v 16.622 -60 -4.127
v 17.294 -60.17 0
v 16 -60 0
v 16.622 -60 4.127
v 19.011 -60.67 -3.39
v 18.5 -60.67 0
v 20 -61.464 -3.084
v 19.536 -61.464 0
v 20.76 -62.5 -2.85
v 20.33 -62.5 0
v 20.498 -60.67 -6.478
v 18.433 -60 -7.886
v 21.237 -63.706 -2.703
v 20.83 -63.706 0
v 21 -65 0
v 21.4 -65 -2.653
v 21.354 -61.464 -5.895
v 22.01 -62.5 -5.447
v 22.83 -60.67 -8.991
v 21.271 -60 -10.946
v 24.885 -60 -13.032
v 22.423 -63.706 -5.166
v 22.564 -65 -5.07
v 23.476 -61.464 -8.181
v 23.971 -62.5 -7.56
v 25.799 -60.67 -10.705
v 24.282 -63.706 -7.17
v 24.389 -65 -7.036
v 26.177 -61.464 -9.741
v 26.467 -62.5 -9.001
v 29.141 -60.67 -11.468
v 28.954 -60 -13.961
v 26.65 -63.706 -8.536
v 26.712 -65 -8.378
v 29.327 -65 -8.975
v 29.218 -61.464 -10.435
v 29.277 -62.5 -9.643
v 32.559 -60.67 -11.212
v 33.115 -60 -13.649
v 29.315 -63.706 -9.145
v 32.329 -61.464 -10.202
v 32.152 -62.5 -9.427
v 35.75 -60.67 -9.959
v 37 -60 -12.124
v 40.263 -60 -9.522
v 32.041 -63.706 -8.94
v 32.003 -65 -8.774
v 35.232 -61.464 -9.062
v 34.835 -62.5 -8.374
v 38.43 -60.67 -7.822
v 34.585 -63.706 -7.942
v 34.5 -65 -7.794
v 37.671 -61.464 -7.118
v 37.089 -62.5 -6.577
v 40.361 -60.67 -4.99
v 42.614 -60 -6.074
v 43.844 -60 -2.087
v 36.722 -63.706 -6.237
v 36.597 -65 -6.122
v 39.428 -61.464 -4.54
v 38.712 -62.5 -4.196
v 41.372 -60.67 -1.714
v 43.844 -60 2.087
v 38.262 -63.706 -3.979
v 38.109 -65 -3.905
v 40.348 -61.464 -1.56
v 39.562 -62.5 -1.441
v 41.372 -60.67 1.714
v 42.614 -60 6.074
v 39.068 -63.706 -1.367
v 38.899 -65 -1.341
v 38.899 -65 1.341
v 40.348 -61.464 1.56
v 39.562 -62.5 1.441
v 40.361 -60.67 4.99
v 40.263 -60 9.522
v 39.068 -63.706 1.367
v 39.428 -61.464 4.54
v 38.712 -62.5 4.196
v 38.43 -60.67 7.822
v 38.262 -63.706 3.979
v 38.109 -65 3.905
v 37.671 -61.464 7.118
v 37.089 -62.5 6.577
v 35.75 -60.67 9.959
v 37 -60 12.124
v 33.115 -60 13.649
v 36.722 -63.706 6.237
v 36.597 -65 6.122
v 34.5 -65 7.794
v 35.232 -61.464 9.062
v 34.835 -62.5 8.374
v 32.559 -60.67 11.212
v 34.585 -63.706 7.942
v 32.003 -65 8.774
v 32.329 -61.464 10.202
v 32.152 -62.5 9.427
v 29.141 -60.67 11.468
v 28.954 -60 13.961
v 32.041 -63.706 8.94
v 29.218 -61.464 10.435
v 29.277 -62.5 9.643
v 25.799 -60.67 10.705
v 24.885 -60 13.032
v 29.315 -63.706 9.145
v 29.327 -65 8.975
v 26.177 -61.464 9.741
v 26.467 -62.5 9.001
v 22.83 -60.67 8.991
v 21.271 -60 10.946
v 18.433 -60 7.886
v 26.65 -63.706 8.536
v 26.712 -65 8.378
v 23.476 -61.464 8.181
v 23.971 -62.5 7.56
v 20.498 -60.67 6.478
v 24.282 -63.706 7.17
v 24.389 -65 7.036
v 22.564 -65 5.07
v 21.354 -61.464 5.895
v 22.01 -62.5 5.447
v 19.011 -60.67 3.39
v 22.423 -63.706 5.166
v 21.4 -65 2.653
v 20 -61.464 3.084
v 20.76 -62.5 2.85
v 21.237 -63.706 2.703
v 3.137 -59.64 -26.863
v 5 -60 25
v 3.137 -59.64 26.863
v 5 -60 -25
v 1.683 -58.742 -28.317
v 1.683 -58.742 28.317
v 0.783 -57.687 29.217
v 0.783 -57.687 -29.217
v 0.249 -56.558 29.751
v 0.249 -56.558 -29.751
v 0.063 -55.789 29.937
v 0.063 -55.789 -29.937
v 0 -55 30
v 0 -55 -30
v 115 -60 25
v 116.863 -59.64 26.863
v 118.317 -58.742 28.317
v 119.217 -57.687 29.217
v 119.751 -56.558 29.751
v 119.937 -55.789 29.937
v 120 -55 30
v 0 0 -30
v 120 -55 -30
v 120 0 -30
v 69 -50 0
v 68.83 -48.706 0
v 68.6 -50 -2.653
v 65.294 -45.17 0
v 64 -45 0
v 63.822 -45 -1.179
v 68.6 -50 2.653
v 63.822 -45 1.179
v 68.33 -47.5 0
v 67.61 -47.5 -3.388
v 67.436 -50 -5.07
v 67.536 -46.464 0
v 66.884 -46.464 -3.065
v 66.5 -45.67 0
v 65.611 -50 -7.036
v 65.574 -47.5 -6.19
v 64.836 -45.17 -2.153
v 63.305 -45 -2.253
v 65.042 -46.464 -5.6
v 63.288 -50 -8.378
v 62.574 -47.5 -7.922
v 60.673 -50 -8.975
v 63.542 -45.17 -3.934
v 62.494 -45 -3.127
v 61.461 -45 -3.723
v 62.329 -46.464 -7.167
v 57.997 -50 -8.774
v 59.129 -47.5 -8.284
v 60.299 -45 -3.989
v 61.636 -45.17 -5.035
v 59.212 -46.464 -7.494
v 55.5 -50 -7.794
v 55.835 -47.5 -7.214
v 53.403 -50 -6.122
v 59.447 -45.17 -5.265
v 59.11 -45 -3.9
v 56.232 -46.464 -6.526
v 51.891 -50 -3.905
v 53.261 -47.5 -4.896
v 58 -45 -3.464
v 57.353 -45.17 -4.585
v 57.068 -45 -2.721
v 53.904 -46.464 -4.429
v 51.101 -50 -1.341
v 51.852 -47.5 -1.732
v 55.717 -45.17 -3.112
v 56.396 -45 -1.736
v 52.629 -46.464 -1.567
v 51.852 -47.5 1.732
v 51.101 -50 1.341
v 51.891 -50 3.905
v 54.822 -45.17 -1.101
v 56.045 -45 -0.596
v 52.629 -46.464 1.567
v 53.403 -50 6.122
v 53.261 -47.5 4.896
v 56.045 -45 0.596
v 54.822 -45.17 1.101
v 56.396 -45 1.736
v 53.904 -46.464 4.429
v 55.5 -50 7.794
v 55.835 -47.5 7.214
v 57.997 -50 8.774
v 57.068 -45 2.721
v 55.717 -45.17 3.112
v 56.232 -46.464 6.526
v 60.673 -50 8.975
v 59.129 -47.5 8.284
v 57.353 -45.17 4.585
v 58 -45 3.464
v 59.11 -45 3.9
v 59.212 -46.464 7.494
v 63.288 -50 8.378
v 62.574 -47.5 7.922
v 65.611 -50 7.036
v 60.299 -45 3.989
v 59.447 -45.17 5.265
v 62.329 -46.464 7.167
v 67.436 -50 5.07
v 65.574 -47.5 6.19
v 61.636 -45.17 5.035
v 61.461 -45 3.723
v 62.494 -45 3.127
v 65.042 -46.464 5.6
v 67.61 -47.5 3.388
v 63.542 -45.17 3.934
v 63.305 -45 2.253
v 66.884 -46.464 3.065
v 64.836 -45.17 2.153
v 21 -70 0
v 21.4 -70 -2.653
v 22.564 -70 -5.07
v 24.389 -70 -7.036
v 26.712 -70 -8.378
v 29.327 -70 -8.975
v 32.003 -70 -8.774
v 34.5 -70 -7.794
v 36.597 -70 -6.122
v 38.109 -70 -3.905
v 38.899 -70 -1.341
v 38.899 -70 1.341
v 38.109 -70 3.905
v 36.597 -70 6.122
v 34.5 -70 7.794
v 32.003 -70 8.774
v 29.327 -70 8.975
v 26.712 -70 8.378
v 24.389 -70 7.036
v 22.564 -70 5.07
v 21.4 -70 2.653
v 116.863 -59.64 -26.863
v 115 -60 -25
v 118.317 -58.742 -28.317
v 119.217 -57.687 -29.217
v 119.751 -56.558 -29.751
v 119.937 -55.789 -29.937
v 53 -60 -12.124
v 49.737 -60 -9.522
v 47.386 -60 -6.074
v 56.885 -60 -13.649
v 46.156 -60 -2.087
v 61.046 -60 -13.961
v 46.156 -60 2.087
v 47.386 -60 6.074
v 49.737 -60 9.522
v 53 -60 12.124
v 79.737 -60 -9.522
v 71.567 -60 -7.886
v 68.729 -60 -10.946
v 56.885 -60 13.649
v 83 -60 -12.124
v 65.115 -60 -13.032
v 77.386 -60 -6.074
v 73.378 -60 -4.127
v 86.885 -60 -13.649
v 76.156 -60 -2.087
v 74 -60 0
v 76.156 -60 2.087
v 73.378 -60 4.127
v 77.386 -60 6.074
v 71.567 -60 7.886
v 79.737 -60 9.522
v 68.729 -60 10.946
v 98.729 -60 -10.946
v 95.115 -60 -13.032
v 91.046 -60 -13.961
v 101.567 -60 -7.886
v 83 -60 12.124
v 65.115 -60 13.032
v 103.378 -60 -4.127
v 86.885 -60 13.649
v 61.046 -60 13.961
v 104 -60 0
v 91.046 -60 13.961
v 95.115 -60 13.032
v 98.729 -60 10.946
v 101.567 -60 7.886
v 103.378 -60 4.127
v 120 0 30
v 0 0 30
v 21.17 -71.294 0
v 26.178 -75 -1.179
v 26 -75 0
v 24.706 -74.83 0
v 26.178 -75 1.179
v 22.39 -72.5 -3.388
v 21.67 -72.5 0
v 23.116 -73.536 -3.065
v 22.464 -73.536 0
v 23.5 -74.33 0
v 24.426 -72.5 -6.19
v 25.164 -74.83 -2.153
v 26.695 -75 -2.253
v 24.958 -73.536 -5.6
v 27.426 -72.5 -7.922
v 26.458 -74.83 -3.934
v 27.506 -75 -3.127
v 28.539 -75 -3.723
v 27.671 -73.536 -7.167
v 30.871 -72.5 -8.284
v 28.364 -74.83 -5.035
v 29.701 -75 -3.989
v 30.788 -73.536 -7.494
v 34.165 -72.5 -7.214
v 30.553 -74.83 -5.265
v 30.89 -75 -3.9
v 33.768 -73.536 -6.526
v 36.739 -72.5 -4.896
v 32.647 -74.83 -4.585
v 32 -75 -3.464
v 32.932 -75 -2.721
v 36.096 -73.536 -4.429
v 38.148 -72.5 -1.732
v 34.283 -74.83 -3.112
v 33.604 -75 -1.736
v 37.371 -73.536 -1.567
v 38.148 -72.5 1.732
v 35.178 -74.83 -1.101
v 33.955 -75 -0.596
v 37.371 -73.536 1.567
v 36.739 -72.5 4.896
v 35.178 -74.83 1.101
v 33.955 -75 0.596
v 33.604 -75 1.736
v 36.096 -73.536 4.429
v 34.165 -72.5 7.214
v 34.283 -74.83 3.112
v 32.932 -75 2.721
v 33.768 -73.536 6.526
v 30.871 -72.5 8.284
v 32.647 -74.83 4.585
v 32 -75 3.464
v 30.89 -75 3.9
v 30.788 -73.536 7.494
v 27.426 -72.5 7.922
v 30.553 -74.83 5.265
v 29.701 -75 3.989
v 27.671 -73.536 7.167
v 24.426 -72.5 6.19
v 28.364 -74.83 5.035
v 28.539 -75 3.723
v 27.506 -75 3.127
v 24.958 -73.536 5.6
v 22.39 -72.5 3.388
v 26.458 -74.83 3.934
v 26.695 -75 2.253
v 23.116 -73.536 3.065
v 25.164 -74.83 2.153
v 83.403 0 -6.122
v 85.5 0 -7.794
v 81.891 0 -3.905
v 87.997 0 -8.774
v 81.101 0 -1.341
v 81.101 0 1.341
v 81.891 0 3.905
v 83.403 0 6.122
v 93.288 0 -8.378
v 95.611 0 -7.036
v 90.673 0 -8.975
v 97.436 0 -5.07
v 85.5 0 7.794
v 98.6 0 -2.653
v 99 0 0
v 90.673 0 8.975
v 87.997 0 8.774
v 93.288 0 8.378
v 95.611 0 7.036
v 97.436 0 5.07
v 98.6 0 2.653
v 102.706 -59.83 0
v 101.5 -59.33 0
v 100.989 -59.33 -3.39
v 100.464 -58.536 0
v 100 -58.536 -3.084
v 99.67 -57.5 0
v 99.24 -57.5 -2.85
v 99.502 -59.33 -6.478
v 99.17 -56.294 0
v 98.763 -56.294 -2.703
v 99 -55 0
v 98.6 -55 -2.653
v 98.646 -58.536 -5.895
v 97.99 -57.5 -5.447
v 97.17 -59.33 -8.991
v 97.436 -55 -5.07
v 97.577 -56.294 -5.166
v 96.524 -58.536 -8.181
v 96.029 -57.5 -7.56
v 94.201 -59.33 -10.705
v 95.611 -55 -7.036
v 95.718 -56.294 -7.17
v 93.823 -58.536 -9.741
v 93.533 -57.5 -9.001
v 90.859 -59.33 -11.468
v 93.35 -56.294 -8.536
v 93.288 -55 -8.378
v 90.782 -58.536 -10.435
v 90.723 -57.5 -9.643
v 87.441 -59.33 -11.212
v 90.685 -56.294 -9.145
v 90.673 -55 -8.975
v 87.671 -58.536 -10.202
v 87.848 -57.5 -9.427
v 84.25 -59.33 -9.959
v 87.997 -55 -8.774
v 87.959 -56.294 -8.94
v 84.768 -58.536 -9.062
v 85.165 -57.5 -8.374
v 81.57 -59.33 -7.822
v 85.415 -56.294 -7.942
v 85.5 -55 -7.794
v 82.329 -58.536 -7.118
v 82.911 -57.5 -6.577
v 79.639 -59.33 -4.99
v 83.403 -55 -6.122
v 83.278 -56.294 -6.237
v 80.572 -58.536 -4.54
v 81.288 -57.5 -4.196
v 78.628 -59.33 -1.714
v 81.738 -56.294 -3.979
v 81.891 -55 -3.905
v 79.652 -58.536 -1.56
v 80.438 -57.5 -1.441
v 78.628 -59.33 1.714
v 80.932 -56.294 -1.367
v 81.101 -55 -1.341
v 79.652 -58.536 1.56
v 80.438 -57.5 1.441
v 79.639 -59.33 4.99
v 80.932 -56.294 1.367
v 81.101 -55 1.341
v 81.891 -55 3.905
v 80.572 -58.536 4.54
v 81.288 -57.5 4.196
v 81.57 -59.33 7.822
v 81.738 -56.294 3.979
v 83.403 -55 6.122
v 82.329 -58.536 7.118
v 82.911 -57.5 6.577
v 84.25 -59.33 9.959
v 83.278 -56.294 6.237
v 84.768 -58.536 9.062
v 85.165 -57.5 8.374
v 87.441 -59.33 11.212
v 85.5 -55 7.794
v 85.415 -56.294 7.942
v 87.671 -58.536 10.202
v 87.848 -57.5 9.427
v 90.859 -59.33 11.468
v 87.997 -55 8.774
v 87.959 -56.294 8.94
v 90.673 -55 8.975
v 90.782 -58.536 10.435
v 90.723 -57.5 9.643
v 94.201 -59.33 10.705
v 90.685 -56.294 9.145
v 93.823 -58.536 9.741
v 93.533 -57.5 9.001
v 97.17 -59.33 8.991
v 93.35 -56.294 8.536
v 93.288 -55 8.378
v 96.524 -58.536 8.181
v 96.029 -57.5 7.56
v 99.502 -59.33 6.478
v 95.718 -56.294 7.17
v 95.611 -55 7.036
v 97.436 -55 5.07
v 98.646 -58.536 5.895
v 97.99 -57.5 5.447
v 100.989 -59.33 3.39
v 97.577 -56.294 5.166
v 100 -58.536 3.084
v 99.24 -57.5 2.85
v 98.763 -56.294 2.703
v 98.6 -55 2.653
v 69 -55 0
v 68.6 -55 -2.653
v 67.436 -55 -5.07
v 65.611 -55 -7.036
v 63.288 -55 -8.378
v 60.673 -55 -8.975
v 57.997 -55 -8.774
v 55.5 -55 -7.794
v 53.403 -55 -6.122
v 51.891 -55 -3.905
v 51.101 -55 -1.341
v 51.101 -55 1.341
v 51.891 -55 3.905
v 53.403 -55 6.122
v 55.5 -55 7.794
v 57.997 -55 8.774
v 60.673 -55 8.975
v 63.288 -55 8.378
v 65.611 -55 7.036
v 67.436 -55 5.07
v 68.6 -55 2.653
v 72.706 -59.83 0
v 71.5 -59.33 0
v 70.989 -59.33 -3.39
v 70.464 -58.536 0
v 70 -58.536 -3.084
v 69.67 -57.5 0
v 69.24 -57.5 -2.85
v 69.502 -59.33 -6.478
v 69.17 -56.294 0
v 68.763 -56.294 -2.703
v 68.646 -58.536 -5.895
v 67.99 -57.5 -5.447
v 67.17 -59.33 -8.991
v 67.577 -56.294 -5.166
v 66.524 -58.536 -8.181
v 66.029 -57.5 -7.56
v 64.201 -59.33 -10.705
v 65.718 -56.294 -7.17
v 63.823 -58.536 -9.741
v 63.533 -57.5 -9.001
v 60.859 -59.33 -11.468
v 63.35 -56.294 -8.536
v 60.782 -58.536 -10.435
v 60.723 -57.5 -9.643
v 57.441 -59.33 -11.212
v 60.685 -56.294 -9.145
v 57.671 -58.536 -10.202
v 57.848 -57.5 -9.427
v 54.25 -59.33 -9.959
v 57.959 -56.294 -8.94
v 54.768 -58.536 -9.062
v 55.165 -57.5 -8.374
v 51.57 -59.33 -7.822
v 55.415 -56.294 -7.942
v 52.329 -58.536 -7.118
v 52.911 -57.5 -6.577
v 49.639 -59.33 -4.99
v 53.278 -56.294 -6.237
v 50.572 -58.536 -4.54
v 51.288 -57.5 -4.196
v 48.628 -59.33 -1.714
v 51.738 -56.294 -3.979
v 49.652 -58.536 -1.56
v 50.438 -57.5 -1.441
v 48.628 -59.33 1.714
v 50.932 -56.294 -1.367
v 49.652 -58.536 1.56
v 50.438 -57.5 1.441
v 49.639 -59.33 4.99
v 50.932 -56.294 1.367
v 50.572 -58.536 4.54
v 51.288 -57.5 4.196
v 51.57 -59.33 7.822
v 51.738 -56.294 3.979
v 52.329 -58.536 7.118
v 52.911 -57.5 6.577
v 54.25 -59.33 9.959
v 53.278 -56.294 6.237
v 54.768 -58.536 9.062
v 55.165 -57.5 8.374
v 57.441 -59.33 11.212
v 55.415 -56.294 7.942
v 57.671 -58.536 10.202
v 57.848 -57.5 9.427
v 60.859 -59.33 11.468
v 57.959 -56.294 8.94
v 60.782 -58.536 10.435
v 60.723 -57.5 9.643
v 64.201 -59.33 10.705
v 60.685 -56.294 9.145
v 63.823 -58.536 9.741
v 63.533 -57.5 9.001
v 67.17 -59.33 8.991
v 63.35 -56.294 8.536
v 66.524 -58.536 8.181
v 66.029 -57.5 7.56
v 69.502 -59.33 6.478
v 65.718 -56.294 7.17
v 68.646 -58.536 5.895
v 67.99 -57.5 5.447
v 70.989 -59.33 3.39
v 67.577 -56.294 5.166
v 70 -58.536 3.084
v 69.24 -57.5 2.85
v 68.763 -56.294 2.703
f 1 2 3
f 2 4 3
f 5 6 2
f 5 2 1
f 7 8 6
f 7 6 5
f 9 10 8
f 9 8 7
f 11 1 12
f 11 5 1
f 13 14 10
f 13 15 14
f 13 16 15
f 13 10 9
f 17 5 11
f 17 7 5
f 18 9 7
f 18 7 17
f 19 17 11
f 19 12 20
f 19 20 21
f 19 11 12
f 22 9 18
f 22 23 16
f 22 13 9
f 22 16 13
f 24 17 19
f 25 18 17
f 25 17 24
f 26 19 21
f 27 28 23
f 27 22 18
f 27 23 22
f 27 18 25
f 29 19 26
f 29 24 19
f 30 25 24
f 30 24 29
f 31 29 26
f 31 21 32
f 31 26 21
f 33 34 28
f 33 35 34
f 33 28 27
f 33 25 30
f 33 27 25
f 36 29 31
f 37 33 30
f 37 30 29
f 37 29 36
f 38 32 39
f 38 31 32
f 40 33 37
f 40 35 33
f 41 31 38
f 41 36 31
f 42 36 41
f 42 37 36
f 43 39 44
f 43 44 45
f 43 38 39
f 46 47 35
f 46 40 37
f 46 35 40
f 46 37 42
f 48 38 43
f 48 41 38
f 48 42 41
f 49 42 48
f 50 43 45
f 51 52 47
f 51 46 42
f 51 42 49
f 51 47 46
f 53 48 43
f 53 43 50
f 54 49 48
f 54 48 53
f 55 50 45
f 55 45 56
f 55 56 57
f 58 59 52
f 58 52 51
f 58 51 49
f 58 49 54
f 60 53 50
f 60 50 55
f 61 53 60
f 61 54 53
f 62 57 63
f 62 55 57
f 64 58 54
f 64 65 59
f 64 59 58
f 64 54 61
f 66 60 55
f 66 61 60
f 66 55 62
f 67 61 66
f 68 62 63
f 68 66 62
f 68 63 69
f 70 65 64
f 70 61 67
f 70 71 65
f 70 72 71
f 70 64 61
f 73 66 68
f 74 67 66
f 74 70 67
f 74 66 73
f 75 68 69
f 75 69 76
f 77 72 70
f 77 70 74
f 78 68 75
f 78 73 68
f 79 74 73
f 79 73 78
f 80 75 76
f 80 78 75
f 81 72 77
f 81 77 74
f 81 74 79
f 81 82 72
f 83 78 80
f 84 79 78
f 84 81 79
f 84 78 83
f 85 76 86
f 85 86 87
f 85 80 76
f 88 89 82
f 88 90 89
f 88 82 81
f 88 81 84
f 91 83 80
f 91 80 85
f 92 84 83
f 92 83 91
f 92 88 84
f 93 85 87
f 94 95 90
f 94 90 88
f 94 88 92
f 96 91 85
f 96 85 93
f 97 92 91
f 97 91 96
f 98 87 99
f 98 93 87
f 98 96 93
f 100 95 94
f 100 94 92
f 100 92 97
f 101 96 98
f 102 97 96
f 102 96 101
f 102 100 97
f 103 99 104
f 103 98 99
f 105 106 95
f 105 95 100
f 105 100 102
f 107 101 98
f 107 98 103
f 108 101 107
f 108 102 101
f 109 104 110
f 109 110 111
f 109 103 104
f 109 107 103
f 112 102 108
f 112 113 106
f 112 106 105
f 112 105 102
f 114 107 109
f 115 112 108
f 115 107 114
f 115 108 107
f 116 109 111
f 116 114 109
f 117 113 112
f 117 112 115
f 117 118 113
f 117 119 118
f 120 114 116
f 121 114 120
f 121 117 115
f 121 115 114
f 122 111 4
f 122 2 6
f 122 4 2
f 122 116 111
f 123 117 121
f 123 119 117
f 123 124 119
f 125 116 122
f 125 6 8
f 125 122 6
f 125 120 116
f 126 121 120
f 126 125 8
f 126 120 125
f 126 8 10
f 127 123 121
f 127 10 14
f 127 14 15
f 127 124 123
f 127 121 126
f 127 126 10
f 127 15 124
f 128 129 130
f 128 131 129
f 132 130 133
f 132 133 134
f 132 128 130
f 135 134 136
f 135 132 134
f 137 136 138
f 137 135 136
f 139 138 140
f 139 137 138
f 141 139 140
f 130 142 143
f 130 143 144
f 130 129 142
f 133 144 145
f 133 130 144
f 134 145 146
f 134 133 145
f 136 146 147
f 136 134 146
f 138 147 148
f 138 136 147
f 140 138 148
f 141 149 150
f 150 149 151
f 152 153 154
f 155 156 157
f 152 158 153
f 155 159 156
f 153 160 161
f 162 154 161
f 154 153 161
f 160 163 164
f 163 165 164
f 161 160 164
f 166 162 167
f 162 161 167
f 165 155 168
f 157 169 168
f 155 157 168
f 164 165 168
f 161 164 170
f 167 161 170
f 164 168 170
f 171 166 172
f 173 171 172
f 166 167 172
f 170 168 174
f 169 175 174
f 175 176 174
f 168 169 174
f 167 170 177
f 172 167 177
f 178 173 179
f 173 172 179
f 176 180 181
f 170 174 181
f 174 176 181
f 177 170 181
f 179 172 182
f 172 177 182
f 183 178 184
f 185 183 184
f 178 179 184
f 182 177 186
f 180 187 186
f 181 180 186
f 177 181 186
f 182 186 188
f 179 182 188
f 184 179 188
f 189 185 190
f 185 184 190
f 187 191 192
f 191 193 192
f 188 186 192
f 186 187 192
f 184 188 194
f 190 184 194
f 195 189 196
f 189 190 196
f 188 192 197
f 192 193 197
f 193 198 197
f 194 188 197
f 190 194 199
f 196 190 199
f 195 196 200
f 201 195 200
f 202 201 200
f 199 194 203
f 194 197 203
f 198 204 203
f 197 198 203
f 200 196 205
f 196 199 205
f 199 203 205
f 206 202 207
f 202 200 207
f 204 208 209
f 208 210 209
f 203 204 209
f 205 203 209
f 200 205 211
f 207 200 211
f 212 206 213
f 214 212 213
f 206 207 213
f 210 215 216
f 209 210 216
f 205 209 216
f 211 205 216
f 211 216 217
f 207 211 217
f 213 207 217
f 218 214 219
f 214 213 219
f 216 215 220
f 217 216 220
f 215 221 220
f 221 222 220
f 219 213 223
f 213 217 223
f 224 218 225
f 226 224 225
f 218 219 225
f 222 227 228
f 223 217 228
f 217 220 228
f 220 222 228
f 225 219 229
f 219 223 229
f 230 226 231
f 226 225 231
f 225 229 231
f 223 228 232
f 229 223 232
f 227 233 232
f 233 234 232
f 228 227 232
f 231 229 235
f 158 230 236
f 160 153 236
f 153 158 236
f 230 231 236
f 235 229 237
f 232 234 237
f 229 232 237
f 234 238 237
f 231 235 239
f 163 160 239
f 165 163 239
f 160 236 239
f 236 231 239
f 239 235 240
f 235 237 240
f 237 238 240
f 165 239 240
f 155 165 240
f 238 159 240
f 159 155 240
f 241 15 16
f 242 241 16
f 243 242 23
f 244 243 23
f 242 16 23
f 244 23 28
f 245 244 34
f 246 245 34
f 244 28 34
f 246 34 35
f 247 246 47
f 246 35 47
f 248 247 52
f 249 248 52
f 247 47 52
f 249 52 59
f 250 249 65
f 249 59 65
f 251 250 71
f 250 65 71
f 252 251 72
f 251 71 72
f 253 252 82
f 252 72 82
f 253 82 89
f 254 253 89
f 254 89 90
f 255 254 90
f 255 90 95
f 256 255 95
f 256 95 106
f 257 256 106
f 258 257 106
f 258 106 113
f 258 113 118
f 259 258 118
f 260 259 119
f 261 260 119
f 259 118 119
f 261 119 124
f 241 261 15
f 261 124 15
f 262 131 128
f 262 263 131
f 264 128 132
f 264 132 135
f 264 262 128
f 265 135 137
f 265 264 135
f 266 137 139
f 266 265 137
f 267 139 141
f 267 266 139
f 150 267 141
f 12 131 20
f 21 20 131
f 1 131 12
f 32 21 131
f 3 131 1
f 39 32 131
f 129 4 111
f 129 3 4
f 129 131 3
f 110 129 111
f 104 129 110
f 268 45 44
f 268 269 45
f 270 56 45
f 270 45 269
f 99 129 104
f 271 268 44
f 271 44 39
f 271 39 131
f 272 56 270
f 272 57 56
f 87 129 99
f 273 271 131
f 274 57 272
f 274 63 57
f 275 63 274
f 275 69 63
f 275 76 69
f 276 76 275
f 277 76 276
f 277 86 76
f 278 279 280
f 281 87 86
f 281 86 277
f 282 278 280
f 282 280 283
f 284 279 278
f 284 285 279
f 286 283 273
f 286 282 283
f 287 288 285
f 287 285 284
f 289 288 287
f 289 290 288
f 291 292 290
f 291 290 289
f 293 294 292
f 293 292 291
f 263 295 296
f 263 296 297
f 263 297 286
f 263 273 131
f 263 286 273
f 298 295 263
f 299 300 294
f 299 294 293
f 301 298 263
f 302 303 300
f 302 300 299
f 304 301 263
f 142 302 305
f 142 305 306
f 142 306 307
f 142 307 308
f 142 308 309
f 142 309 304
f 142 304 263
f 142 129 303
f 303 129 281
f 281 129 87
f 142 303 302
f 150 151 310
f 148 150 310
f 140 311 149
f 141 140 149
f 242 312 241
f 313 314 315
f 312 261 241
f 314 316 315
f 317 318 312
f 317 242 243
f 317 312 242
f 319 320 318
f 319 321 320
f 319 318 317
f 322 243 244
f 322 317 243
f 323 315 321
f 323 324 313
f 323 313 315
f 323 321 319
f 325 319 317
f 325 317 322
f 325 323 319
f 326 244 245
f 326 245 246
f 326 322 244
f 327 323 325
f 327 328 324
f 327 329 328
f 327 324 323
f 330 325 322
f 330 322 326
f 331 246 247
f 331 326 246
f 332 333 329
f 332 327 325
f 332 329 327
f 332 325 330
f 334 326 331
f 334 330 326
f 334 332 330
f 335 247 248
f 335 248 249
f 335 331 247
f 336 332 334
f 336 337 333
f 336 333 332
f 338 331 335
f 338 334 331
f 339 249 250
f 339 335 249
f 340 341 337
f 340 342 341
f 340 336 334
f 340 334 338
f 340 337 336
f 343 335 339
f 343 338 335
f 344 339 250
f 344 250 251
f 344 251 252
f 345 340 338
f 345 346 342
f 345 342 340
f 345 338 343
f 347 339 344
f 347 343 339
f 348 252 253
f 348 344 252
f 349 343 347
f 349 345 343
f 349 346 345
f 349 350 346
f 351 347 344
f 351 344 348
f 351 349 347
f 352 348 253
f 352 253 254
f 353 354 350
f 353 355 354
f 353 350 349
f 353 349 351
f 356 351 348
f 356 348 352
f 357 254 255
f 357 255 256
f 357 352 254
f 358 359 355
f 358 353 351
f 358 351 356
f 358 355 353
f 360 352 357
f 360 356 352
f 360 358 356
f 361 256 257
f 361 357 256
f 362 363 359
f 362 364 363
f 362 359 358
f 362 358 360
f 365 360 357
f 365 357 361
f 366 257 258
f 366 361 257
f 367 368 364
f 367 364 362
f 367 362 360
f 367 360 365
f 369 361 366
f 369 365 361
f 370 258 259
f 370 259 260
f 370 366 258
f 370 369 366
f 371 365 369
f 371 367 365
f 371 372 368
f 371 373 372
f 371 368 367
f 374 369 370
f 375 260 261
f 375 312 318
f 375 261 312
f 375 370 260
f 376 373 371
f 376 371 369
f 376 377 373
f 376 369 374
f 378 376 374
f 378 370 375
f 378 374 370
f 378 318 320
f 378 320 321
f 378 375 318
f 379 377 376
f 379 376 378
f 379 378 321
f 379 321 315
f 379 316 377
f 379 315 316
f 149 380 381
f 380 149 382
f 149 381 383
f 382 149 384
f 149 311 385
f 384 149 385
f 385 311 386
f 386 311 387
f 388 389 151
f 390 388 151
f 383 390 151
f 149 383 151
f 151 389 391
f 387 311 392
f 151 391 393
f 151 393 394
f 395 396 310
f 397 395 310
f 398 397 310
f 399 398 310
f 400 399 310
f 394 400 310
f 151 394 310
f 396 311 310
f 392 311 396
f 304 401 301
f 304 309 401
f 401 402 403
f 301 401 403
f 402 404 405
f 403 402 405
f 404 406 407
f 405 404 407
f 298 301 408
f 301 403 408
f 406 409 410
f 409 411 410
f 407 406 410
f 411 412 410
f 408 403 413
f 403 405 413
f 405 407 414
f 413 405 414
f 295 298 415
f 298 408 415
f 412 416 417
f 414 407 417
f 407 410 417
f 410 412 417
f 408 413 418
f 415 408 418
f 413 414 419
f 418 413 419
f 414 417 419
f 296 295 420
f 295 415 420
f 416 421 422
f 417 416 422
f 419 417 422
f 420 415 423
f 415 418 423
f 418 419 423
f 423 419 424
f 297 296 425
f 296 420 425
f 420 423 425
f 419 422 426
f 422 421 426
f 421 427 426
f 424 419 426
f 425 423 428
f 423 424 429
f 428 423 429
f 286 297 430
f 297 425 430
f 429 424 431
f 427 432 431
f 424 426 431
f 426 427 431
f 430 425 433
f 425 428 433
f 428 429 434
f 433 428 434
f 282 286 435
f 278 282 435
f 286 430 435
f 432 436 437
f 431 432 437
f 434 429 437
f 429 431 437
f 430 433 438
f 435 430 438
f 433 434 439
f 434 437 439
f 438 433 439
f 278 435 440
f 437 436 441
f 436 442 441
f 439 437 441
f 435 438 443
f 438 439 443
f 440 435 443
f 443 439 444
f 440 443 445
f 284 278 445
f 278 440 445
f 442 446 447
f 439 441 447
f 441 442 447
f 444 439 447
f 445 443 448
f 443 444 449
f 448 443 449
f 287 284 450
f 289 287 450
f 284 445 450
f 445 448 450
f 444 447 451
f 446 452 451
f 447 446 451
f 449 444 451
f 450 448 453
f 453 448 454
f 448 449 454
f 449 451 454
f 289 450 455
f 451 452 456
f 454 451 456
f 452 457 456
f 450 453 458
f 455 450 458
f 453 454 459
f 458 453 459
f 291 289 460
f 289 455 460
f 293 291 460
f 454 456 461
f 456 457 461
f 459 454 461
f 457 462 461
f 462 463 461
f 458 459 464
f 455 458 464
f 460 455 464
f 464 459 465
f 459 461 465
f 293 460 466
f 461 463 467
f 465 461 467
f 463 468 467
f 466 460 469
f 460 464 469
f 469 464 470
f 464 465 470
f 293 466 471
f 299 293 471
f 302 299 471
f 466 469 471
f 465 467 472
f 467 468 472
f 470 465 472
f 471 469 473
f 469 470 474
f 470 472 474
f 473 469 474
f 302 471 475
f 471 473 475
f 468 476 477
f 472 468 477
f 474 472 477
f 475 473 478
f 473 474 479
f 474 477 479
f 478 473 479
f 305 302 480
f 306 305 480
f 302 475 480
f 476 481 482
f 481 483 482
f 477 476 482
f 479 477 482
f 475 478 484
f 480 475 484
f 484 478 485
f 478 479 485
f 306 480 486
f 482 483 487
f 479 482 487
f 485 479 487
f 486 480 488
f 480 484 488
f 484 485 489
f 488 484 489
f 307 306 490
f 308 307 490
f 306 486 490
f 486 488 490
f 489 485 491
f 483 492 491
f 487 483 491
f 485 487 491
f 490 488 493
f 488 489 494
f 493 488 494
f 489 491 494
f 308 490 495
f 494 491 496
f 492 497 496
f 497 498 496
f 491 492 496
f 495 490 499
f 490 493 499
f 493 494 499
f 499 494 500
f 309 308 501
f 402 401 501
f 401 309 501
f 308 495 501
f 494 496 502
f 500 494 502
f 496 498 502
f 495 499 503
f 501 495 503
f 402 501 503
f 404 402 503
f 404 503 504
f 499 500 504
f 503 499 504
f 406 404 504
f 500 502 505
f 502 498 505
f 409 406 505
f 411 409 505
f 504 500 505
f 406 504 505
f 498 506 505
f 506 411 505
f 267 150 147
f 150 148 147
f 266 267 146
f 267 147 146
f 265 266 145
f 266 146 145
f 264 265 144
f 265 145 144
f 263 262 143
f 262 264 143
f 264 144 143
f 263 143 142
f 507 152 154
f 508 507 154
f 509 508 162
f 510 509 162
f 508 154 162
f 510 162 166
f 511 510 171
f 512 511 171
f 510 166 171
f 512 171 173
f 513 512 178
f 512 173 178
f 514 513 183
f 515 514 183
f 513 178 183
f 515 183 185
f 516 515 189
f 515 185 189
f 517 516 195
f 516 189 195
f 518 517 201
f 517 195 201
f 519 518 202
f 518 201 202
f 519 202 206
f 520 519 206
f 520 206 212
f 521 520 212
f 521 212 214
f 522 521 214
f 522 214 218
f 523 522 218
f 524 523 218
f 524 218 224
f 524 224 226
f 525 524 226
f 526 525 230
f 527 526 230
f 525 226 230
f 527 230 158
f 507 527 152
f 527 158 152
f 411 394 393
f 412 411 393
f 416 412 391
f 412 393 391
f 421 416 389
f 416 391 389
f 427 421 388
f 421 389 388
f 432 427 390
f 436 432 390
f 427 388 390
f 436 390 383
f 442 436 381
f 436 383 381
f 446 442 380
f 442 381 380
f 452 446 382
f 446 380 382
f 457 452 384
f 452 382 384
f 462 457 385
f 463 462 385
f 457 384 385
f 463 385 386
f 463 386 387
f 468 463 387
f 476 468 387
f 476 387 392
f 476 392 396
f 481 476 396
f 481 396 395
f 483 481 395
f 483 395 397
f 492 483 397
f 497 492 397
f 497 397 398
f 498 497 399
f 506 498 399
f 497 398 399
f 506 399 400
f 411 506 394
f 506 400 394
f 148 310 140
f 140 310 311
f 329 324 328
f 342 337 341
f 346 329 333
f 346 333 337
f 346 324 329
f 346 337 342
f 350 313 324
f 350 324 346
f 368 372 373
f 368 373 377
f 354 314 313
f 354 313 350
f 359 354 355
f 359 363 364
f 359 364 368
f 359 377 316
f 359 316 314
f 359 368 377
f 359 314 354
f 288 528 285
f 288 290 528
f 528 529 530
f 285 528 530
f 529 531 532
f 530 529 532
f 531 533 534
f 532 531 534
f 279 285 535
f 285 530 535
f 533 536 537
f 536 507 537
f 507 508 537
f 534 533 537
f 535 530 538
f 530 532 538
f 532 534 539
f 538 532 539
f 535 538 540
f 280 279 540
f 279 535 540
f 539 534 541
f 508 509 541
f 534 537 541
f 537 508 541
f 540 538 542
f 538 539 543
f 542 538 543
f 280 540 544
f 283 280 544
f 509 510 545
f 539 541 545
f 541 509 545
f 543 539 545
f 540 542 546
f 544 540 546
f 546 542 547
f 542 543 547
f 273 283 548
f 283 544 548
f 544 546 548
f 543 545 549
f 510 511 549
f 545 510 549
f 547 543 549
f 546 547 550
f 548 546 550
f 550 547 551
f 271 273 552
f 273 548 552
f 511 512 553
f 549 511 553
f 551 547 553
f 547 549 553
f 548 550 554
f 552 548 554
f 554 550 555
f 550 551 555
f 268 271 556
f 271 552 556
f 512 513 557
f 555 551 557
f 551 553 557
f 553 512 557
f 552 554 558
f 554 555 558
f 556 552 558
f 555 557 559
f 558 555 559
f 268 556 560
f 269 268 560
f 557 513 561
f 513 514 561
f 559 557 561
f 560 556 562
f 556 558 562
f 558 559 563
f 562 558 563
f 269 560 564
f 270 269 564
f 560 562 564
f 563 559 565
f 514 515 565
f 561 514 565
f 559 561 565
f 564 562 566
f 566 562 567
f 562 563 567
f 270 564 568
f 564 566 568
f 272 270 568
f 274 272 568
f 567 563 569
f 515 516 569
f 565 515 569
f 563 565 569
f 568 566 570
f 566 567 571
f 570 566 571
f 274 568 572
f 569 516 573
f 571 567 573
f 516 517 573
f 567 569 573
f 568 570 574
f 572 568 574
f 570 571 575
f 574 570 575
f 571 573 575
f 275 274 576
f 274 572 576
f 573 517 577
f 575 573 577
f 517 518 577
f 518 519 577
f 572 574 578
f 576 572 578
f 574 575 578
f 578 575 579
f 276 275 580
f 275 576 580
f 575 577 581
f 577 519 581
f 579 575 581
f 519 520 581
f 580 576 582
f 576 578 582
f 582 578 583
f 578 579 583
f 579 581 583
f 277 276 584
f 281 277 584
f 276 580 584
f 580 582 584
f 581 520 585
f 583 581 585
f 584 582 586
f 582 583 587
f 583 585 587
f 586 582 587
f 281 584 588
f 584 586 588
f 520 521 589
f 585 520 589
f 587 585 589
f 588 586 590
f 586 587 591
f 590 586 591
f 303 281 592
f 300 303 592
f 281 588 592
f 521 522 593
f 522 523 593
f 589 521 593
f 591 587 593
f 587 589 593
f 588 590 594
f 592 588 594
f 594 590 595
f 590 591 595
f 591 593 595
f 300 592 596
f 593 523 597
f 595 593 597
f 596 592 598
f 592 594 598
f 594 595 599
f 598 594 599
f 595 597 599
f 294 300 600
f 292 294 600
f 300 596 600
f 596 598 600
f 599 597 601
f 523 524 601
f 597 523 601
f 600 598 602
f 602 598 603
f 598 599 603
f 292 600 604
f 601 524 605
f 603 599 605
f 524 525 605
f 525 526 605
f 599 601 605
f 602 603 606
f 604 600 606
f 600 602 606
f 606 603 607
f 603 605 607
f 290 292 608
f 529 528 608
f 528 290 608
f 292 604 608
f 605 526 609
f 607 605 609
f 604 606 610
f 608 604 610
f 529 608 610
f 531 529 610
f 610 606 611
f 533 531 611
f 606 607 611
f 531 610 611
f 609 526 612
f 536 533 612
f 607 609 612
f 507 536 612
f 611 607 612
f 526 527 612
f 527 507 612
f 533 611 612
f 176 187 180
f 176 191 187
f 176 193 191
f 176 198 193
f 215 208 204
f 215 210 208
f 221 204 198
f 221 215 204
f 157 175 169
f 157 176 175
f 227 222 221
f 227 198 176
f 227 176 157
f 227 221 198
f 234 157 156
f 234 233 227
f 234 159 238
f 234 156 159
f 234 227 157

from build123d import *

# Parameters (mm, degrees)
F1_DEPTH = 60
F3_DEPTH = 75
F4_DEPTH = 45
F5_R     = 5
F6_R     = 5
F7_R     = 5


with BuildPart() as f1:
    # F0 (on Front) → F1 (new body)
    with BuildSketch(Plane.XZ):
        with BuildLine():
            ThreePointArc((81, 0), (90, 9), (99, 0))
            Line((99, 0), (120, 0))
            Line((120, 0), (120, 30))
            Line((120, 30), (0, 30))
            Line((0, 30), (0, 0))
            Line((0, 0), (21, 0))
            ThreePointArc((21, 0), (30, 9), (39, 0))
            Line((39, 0), (51, 0))
            ThreePointArc((51, 0), (60, 9), (69, 0))
            Line((69, 0), (81, 0))
        make_face()
        with BuildLine():
            Line((120, 0), (99, 0))
            ThreePointArc((99, 0), (90, -9), (81, 0))
            Line((81, 0), (69, 0))
            ThreePointArc((69, 0), (60, -9), (51, 0))
            Line((51, 0), (39, 0))
            ThreePointArc((39, 0), (30, -9), (21, 0))
            Line((21, 0), (0, 0))
            Line((0, 0), (0, -30))
            Line((0, -30), (120, -30))
            Line((120, -30), (120, 0))
        make_face()
    extrude(amount=F1_DEPTH)

    # F2 (on Front) → F3 (join)
    with BuildSketch(Plane.XZ):
        with BuildLine():
            ThreePointArc((39, 0), (30, 9), (21, 0))
            Line((21, 0), (30, 0))
            Line((30, 0), (39, 0))
        make_face()
        with BuildLine():
            Line((30, 0), (21, 0))
            ThreePointArc((21, 0), (30, -9), (39, 0))
            Line((39, 0), (30, 0))
        make_face()
    extrude(amount=F3_DEPTH)

    # F2 (on Front) → F4 (join)
    with BuildSketch(Plane.XZ):
        with BuildLine():
            ThreePointArc((69, 0), (60, 9), (51, 0))
            Line((51, 0), (60, 0))
            Line((60, 0), (69, 0))
        make_face()
        with BuildLine():
            Line((60, 0), (51, 0))
            ThreePointArc((51, 0), (60, -9), (69, 0))
            Line((69, 0), (60, 0))
        make_face()
    extrude(amount=F4_DEPTH)

    # F5
    f5_edges = [f1.edges().sort_by_distance(p)[0] for p in [
        (81, -60, 0),
        (60, -60, 30),
        (0, -60, 0),
        (60, -60, -30),
        (120, -60, 0),
        (39, -60, 0),
        (51, -60, 0),
    ]]
    fillet(f5_edges, radius=F5_R)

    # F6
    f6_edges = [f1.edges().sort_by_distance(p)[0] for p in [
        (39, -75, 0),
    ]]
    fillet(f6_edges, radius=F6_R)

    # F7
    f7_edges = [f1.edges().sort_by_distance(p)[0] for p in [
        (51, -45, 0),
    ]]
    fillet(f7_edges, radius=F7_R)


solid = f1.part
